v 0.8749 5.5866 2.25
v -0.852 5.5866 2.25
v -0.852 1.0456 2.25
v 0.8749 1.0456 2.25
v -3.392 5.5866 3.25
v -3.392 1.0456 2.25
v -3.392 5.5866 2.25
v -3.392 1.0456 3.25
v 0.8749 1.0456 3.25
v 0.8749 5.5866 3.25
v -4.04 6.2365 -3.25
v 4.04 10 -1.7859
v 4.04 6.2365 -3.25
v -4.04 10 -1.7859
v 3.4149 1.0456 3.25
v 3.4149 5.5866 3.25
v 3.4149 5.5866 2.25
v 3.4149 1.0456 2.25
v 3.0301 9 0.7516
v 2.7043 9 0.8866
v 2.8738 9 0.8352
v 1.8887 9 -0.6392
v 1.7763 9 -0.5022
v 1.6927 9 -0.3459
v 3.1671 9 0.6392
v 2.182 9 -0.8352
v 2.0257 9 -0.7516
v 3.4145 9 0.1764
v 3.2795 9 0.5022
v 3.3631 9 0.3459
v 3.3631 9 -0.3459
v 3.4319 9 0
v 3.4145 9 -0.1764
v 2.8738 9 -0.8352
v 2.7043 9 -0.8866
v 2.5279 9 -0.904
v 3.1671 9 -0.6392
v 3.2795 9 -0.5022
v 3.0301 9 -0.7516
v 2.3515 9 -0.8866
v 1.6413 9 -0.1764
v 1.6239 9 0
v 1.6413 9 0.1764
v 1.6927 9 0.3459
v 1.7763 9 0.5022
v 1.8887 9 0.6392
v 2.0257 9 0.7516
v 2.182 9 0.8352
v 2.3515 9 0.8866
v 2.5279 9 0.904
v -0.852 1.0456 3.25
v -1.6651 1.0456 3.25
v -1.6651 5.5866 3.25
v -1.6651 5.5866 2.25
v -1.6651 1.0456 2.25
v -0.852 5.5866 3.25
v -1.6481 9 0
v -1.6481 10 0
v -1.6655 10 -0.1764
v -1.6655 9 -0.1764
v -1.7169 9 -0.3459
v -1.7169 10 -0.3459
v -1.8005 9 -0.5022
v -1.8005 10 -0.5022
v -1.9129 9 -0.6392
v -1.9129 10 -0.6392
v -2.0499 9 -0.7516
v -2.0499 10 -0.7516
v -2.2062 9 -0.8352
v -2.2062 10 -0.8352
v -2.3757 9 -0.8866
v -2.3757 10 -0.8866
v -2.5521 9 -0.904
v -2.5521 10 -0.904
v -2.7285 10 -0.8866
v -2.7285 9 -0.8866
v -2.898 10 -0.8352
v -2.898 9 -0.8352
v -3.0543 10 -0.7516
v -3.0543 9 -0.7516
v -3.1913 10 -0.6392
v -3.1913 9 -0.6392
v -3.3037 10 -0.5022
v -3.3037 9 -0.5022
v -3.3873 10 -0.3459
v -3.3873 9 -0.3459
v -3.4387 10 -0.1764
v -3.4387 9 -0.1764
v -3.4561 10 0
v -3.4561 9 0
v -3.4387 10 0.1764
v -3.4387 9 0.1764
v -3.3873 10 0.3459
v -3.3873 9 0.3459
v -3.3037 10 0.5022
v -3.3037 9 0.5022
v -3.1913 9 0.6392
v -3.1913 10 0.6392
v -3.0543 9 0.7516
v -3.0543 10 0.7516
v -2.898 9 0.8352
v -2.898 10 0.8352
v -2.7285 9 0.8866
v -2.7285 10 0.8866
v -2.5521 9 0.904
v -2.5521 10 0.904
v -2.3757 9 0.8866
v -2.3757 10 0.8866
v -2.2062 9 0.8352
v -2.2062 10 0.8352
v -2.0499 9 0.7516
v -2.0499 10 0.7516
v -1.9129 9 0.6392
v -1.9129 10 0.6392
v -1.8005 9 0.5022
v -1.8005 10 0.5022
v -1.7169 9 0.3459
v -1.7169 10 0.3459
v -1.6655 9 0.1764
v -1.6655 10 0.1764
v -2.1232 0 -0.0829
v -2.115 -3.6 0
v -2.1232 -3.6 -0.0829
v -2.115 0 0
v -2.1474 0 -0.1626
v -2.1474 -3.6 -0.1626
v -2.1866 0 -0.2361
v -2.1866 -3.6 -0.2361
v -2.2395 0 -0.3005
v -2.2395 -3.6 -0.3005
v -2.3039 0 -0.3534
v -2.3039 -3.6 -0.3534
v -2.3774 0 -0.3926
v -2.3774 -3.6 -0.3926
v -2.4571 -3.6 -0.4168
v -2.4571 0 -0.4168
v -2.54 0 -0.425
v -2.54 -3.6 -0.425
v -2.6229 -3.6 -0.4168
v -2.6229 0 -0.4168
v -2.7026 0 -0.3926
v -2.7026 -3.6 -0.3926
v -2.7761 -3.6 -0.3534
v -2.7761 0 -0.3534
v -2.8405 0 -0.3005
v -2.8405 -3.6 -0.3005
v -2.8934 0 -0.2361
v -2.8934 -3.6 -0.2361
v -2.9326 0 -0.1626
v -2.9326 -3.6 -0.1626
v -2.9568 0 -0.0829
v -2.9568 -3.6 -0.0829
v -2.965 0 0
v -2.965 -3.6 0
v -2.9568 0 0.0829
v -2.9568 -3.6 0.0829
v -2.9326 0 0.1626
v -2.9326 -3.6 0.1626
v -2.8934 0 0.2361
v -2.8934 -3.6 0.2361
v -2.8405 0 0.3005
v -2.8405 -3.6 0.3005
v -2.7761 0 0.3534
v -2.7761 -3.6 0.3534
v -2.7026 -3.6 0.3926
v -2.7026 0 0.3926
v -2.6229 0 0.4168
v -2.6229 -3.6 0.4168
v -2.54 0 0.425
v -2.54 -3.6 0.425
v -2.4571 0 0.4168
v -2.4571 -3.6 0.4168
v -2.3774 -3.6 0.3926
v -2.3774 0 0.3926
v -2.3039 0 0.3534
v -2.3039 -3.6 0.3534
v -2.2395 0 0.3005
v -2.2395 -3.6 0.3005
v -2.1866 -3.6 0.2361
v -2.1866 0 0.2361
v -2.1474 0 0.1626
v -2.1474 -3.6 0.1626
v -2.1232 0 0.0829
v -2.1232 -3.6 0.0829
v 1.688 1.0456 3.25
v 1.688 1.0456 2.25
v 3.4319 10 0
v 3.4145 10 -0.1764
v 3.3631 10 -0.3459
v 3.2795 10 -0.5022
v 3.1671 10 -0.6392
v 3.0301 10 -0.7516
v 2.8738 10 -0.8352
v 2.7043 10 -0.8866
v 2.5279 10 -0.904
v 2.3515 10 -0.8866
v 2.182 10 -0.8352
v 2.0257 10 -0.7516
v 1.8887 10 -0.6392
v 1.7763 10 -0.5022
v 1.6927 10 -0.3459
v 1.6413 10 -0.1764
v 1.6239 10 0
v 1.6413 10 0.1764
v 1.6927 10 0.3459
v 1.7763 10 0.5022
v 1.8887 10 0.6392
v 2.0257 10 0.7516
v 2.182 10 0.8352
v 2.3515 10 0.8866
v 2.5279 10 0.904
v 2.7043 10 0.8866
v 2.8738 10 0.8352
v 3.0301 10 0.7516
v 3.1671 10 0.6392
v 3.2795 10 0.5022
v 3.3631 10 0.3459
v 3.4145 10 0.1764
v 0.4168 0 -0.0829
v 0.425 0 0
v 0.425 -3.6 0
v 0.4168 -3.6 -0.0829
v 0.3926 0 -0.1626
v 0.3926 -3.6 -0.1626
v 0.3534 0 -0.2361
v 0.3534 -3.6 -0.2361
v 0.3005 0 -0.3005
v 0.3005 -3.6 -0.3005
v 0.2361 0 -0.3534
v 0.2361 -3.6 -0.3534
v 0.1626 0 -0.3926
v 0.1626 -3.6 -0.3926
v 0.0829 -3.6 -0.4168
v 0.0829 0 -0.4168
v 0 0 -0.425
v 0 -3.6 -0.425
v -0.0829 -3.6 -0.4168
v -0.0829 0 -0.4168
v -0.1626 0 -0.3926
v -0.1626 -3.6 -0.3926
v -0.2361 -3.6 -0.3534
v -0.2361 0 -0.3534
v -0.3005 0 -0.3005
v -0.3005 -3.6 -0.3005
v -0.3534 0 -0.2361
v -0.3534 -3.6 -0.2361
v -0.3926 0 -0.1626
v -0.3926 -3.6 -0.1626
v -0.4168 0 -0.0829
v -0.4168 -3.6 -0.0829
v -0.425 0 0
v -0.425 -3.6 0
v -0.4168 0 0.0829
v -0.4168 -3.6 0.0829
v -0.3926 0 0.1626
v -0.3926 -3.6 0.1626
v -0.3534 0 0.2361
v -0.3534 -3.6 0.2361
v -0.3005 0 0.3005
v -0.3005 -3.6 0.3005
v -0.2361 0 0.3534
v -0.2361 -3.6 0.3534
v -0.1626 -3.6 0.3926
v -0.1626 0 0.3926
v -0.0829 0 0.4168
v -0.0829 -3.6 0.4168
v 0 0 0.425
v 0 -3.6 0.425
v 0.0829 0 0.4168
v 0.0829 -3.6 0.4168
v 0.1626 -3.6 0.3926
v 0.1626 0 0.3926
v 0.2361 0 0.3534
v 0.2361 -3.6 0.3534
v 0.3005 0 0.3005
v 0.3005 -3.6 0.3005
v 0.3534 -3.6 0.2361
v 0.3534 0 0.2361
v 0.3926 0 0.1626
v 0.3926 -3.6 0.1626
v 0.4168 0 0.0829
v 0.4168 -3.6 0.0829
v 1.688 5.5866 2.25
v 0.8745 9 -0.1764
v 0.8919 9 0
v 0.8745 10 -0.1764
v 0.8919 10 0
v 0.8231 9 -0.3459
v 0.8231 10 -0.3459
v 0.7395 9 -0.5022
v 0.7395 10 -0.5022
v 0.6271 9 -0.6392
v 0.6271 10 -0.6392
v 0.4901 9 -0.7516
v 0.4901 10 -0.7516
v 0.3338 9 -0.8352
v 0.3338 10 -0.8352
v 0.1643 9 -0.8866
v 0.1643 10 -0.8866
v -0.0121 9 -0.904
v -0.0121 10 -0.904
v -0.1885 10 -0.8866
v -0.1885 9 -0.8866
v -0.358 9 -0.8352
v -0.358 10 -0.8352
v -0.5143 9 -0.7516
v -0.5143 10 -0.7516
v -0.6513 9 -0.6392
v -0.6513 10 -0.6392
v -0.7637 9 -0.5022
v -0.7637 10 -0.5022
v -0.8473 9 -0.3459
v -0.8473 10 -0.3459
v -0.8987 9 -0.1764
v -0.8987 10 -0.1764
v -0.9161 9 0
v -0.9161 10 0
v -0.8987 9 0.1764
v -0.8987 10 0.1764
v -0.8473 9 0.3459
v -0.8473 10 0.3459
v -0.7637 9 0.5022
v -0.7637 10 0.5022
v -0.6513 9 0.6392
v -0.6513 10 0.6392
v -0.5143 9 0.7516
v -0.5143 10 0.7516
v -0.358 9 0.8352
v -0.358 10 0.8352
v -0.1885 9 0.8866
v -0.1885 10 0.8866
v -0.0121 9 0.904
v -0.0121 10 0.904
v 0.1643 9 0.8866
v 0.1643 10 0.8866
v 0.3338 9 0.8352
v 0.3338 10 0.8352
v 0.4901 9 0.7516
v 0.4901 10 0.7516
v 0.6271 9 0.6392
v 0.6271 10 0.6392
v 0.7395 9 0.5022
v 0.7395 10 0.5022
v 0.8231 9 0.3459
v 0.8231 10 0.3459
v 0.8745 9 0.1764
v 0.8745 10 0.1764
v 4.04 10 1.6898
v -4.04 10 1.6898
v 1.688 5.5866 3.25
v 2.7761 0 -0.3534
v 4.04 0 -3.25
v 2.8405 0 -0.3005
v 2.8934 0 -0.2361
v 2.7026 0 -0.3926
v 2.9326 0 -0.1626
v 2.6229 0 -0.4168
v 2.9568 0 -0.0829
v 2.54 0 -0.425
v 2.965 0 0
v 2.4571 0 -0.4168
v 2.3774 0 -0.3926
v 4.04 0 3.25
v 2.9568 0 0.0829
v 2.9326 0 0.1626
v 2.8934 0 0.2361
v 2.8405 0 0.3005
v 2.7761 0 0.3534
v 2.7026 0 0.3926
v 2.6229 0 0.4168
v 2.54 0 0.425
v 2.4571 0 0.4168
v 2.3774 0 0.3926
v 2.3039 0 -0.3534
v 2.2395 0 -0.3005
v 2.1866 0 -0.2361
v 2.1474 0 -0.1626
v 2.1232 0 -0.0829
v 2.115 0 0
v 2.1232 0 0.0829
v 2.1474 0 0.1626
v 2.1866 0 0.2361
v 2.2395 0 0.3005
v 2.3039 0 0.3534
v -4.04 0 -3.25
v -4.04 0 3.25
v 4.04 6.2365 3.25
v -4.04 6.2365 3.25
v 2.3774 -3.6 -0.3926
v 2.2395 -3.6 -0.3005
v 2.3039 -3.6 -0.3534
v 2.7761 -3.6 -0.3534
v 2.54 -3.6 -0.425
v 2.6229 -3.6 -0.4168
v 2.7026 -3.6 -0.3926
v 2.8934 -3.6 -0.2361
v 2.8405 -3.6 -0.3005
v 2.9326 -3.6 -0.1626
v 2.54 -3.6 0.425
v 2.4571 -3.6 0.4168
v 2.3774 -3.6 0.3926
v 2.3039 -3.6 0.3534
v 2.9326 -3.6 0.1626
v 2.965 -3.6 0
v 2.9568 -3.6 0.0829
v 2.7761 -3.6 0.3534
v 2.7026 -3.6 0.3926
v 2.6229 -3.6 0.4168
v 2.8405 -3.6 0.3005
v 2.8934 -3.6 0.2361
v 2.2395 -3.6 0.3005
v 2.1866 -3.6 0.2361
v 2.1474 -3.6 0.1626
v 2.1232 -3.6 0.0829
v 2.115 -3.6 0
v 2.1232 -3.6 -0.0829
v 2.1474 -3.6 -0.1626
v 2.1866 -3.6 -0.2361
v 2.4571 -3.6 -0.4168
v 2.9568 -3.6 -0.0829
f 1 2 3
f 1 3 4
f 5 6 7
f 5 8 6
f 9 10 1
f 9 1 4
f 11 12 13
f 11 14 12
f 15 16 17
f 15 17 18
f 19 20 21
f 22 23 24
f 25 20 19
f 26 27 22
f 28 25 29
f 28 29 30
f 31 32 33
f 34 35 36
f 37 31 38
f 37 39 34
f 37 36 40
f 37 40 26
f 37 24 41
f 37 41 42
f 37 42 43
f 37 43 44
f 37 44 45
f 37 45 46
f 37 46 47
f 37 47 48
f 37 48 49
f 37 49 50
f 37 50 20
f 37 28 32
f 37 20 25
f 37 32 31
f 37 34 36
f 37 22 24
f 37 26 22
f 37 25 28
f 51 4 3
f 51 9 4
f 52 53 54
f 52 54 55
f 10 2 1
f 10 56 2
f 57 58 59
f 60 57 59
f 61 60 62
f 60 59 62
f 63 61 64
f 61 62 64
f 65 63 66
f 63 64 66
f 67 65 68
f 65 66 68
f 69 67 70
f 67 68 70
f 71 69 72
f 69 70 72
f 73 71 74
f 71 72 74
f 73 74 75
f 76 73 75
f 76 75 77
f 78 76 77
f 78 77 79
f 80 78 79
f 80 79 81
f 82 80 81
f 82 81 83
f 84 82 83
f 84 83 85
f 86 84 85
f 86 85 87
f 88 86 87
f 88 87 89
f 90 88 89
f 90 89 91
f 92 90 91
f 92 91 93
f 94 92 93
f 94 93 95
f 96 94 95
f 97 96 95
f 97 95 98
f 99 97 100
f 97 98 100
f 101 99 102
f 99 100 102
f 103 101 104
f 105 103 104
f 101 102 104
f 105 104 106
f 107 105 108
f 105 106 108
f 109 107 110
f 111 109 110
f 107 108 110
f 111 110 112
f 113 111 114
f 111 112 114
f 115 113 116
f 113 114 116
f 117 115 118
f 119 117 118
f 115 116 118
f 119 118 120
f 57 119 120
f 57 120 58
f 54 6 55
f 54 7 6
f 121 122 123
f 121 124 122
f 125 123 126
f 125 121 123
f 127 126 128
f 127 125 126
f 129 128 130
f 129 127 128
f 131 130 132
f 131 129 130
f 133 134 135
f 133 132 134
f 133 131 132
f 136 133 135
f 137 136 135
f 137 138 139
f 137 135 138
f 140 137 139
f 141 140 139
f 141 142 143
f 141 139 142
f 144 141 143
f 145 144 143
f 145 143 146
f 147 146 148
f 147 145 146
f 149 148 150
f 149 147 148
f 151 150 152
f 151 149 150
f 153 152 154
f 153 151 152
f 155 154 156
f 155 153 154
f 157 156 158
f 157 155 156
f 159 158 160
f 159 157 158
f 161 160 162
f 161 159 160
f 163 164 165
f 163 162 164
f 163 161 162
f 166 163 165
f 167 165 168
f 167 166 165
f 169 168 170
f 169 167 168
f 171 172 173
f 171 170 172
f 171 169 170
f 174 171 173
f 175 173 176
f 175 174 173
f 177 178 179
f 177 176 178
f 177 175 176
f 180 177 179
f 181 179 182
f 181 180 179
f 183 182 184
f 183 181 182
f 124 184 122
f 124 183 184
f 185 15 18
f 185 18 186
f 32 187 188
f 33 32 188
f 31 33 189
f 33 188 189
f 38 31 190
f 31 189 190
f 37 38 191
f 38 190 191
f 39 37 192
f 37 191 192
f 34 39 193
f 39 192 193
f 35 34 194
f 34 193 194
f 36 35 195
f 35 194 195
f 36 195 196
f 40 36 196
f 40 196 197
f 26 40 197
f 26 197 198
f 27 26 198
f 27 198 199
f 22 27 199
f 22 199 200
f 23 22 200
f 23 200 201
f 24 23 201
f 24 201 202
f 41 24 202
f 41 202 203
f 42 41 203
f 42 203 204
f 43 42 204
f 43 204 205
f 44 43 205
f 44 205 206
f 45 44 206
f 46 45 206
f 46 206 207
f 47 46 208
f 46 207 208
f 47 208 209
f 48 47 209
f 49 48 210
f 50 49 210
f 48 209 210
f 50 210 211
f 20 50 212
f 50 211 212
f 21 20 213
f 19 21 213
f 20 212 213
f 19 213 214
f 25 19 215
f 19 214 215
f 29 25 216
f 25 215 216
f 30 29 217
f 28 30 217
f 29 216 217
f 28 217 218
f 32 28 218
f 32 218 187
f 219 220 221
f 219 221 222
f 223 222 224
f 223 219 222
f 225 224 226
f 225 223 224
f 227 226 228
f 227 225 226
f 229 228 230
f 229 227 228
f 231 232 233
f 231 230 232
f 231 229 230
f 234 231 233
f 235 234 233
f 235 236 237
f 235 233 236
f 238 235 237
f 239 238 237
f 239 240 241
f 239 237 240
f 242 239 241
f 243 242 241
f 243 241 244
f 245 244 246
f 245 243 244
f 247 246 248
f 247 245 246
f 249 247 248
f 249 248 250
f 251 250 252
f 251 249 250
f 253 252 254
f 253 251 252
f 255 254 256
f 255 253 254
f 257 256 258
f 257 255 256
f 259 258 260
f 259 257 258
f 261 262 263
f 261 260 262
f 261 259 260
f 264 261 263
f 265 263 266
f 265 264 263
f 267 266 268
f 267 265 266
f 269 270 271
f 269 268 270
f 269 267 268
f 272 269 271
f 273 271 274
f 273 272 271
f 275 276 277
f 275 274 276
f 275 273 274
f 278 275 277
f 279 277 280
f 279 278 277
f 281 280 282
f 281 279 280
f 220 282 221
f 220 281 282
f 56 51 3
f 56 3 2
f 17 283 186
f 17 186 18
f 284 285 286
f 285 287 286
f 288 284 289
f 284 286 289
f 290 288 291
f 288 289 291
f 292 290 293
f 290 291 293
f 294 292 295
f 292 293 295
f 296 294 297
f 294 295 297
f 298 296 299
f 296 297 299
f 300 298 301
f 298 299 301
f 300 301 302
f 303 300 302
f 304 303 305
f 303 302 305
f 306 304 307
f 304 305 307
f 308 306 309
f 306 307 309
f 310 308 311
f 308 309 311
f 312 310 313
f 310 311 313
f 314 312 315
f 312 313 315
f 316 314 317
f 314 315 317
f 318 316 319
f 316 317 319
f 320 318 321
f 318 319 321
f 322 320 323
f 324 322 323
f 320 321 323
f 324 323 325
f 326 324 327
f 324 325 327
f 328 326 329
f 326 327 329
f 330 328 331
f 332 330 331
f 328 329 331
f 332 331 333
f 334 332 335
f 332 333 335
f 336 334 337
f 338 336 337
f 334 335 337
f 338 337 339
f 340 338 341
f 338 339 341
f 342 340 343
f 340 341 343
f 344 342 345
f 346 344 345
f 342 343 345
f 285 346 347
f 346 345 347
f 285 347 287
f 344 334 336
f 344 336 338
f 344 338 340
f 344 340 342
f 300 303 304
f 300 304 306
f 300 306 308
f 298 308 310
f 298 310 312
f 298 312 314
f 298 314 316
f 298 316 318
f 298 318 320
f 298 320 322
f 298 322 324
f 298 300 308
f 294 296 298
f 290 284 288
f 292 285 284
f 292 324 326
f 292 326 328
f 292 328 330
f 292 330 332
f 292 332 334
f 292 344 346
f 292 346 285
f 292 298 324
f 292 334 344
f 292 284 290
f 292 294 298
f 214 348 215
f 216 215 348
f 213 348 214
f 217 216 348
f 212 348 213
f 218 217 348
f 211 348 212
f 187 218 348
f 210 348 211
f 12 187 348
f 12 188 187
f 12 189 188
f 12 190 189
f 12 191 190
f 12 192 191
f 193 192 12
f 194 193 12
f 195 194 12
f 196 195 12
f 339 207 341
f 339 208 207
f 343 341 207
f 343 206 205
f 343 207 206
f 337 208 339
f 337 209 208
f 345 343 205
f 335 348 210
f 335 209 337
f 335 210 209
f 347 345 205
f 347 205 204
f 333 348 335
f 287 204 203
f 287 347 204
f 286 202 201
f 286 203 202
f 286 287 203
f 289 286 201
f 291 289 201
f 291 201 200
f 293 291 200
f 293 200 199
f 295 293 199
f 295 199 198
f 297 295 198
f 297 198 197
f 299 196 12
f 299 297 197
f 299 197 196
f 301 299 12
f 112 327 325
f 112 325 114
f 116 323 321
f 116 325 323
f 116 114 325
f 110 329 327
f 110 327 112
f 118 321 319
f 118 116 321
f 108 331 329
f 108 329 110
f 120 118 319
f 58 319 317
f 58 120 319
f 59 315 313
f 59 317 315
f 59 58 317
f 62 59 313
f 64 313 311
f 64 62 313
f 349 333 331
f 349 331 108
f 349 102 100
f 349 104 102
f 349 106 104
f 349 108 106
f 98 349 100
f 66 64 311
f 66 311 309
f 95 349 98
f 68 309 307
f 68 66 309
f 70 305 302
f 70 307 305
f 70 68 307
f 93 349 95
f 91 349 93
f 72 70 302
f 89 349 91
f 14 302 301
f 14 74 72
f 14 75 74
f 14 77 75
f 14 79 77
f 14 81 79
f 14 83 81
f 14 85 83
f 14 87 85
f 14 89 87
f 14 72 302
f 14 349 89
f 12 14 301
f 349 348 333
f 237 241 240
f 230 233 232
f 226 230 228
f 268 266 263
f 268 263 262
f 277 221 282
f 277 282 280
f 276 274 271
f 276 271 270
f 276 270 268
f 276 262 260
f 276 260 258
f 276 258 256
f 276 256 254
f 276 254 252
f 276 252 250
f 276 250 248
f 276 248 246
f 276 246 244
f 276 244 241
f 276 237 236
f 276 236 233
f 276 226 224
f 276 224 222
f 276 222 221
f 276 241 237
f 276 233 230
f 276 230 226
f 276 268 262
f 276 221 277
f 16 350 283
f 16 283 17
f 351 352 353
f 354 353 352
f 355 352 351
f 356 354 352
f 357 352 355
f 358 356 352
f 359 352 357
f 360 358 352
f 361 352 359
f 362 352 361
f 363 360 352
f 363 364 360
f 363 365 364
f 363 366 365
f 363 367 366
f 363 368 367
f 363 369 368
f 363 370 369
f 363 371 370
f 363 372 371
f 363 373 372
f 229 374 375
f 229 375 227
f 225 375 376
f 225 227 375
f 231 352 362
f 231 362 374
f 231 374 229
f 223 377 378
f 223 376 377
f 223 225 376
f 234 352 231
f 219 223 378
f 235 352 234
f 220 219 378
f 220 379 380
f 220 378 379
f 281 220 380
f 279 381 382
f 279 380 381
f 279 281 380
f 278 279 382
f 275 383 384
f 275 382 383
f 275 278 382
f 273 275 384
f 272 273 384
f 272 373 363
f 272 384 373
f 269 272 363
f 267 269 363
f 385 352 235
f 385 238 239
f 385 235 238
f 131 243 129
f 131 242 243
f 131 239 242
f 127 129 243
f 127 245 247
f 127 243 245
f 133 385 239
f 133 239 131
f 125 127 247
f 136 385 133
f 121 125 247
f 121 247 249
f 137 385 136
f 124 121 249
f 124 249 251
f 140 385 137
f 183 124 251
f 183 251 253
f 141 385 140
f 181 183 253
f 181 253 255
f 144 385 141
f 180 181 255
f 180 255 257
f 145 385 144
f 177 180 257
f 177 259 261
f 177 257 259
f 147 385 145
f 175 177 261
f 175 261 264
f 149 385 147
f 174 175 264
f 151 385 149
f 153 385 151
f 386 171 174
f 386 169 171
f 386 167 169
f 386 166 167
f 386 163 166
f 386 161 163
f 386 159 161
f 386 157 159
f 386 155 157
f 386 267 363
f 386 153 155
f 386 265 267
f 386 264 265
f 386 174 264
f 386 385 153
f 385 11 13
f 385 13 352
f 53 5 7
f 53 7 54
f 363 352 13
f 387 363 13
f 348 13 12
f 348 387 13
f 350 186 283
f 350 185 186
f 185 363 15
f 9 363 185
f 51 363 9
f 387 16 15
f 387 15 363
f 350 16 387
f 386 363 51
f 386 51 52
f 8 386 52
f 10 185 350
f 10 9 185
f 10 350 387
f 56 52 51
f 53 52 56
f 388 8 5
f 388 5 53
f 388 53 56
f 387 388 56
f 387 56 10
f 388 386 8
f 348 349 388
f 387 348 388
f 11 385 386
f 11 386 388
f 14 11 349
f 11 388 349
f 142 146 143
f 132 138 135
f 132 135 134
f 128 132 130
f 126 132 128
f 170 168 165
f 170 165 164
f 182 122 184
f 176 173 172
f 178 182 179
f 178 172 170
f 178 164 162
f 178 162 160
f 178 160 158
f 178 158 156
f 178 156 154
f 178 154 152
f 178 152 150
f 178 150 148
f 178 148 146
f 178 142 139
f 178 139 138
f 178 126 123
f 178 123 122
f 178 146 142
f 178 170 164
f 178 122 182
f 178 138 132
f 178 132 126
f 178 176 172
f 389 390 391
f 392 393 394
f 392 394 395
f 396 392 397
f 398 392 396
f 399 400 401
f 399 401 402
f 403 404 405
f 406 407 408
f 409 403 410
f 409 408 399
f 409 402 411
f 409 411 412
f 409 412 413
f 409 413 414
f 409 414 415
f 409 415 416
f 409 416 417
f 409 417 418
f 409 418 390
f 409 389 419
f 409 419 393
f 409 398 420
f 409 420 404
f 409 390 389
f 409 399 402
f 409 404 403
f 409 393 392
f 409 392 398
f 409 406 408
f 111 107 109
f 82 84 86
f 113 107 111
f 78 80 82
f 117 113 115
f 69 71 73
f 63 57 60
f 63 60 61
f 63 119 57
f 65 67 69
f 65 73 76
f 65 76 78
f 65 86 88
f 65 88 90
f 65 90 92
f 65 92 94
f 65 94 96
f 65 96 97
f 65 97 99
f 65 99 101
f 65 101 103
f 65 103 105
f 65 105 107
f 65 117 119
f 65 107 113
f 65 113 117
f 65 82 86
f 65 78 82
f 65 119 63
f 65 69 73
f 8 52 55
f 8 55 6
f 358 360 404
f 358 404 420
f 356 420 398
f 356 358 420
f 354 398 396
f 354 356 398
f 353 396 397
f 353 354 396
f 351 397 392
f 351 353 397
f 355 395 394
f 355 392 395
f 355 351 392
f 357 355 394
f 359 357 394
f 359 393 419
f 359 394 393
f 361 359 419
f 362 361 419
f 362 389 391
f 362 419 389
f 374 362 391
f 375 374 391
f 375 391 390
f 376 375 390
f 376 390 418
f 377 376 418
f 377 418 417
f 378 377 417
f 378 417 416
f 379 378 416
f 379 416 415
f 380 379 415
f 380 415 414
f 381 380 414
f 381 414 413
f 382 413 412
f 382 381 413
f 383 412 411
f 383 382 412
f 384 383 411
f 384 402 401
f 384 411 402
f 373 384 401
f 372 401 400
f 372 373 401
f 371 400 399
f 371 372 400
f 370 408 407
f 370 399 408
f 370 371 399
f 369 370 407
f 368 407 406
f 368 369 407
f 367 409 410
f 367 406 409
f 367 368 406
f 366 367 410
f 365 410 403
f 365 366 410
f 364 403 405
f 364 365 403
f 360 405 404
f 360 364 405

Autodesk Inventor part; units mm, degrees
ref_plane "YZ Plane" through (0, 0, 0) normal (1, 0, 0) x (0, 1, 0)
ref_plane "XZ Plane" through (0, 0, 0) normal (0, 1, 0) x (-1, 0, 0)
ref_plane "XY Plane" through (0, 0, 0) normal (0, 0, 1) x (1, 0, 0)
sketch "Sketch1" plane through (0, 0, 0) normal (1, 0, 0) x (0, 1, 0)
  line L0 (0, 3.25) -> (10, 3.25)
  line L1 (10, 3.25) -> (10, -3.25)
  line L2 (10, -3.25) -> (0, -3.25)
  line L3 (0, -3.25) -> (0, 3.25)
  line L4 (10, 1.6898) -> (6.2365, 3.25)
  line L5 (10, -1.7859) -> (6.2365, -3.25)
  point P0 (0, 0)
  dimension "d0" = 10
  dimension "d1" = 6.5
  dimension "d2" = 3.25
  dimension "d3" = 0
extrude "Extrusion1" add sketch "Sketch1" along normal mid plane 8.08 contours L0 L4 L1 L5 L2 L3
sketch "Sketch2" plane through (-4.04, 0, -3.25) normal (0, -1, 0) x (1, 0, 0)
  circle A0 centre (1.5, 3.25) radius 0.425
  line L0 (0, 0) -> (0, 6.5) projected
  point P0 (4.04, 3.25)
  dimension "d7" = 0.85
  dimension "d12" = 1.5
extrude "Extrusion2" add sketch "Sketch2" along normal blind 3.6
sketch "Sketch3" plane through (-4.04, 10, 1.6898) normal (0, 1, 0) x (1, 0, 0)
  circle A0 centre (1.4879, 1.6898) radius 0.904
  point P0 (4.04, 1.6898)
extrude "Extrusion3" cut sketch "Sketch3" against normal blind 1
sketch "Sketch4" plane through (-4.04, 0, 3.25) normal (0, 0, 1) x (1, 0, 0)
  line L0 (0.648, 5.5866) -> (2.3749, 5.5866)
  line L1 (2.3749, 5.5866) -> (2.3749, 1.0456)
  line L2 (2.3749, 1.0456) -> (0.648, 1.0456)
  line L3 (0.648, 1.0456) -> (0.648, 5.5866)
  point P0 (4.04, 0)
extrude "Extrusion4" cut sketch "Sketch4" against normal blind 1
pattern_linear "Rectangular Pattern1" count 3 spacing 2.54 along (1, 0, 0) of "Extrusion4", "Extrusion3", "Extrusion2"
properties part number "Screw_Terminal_3Pos"
